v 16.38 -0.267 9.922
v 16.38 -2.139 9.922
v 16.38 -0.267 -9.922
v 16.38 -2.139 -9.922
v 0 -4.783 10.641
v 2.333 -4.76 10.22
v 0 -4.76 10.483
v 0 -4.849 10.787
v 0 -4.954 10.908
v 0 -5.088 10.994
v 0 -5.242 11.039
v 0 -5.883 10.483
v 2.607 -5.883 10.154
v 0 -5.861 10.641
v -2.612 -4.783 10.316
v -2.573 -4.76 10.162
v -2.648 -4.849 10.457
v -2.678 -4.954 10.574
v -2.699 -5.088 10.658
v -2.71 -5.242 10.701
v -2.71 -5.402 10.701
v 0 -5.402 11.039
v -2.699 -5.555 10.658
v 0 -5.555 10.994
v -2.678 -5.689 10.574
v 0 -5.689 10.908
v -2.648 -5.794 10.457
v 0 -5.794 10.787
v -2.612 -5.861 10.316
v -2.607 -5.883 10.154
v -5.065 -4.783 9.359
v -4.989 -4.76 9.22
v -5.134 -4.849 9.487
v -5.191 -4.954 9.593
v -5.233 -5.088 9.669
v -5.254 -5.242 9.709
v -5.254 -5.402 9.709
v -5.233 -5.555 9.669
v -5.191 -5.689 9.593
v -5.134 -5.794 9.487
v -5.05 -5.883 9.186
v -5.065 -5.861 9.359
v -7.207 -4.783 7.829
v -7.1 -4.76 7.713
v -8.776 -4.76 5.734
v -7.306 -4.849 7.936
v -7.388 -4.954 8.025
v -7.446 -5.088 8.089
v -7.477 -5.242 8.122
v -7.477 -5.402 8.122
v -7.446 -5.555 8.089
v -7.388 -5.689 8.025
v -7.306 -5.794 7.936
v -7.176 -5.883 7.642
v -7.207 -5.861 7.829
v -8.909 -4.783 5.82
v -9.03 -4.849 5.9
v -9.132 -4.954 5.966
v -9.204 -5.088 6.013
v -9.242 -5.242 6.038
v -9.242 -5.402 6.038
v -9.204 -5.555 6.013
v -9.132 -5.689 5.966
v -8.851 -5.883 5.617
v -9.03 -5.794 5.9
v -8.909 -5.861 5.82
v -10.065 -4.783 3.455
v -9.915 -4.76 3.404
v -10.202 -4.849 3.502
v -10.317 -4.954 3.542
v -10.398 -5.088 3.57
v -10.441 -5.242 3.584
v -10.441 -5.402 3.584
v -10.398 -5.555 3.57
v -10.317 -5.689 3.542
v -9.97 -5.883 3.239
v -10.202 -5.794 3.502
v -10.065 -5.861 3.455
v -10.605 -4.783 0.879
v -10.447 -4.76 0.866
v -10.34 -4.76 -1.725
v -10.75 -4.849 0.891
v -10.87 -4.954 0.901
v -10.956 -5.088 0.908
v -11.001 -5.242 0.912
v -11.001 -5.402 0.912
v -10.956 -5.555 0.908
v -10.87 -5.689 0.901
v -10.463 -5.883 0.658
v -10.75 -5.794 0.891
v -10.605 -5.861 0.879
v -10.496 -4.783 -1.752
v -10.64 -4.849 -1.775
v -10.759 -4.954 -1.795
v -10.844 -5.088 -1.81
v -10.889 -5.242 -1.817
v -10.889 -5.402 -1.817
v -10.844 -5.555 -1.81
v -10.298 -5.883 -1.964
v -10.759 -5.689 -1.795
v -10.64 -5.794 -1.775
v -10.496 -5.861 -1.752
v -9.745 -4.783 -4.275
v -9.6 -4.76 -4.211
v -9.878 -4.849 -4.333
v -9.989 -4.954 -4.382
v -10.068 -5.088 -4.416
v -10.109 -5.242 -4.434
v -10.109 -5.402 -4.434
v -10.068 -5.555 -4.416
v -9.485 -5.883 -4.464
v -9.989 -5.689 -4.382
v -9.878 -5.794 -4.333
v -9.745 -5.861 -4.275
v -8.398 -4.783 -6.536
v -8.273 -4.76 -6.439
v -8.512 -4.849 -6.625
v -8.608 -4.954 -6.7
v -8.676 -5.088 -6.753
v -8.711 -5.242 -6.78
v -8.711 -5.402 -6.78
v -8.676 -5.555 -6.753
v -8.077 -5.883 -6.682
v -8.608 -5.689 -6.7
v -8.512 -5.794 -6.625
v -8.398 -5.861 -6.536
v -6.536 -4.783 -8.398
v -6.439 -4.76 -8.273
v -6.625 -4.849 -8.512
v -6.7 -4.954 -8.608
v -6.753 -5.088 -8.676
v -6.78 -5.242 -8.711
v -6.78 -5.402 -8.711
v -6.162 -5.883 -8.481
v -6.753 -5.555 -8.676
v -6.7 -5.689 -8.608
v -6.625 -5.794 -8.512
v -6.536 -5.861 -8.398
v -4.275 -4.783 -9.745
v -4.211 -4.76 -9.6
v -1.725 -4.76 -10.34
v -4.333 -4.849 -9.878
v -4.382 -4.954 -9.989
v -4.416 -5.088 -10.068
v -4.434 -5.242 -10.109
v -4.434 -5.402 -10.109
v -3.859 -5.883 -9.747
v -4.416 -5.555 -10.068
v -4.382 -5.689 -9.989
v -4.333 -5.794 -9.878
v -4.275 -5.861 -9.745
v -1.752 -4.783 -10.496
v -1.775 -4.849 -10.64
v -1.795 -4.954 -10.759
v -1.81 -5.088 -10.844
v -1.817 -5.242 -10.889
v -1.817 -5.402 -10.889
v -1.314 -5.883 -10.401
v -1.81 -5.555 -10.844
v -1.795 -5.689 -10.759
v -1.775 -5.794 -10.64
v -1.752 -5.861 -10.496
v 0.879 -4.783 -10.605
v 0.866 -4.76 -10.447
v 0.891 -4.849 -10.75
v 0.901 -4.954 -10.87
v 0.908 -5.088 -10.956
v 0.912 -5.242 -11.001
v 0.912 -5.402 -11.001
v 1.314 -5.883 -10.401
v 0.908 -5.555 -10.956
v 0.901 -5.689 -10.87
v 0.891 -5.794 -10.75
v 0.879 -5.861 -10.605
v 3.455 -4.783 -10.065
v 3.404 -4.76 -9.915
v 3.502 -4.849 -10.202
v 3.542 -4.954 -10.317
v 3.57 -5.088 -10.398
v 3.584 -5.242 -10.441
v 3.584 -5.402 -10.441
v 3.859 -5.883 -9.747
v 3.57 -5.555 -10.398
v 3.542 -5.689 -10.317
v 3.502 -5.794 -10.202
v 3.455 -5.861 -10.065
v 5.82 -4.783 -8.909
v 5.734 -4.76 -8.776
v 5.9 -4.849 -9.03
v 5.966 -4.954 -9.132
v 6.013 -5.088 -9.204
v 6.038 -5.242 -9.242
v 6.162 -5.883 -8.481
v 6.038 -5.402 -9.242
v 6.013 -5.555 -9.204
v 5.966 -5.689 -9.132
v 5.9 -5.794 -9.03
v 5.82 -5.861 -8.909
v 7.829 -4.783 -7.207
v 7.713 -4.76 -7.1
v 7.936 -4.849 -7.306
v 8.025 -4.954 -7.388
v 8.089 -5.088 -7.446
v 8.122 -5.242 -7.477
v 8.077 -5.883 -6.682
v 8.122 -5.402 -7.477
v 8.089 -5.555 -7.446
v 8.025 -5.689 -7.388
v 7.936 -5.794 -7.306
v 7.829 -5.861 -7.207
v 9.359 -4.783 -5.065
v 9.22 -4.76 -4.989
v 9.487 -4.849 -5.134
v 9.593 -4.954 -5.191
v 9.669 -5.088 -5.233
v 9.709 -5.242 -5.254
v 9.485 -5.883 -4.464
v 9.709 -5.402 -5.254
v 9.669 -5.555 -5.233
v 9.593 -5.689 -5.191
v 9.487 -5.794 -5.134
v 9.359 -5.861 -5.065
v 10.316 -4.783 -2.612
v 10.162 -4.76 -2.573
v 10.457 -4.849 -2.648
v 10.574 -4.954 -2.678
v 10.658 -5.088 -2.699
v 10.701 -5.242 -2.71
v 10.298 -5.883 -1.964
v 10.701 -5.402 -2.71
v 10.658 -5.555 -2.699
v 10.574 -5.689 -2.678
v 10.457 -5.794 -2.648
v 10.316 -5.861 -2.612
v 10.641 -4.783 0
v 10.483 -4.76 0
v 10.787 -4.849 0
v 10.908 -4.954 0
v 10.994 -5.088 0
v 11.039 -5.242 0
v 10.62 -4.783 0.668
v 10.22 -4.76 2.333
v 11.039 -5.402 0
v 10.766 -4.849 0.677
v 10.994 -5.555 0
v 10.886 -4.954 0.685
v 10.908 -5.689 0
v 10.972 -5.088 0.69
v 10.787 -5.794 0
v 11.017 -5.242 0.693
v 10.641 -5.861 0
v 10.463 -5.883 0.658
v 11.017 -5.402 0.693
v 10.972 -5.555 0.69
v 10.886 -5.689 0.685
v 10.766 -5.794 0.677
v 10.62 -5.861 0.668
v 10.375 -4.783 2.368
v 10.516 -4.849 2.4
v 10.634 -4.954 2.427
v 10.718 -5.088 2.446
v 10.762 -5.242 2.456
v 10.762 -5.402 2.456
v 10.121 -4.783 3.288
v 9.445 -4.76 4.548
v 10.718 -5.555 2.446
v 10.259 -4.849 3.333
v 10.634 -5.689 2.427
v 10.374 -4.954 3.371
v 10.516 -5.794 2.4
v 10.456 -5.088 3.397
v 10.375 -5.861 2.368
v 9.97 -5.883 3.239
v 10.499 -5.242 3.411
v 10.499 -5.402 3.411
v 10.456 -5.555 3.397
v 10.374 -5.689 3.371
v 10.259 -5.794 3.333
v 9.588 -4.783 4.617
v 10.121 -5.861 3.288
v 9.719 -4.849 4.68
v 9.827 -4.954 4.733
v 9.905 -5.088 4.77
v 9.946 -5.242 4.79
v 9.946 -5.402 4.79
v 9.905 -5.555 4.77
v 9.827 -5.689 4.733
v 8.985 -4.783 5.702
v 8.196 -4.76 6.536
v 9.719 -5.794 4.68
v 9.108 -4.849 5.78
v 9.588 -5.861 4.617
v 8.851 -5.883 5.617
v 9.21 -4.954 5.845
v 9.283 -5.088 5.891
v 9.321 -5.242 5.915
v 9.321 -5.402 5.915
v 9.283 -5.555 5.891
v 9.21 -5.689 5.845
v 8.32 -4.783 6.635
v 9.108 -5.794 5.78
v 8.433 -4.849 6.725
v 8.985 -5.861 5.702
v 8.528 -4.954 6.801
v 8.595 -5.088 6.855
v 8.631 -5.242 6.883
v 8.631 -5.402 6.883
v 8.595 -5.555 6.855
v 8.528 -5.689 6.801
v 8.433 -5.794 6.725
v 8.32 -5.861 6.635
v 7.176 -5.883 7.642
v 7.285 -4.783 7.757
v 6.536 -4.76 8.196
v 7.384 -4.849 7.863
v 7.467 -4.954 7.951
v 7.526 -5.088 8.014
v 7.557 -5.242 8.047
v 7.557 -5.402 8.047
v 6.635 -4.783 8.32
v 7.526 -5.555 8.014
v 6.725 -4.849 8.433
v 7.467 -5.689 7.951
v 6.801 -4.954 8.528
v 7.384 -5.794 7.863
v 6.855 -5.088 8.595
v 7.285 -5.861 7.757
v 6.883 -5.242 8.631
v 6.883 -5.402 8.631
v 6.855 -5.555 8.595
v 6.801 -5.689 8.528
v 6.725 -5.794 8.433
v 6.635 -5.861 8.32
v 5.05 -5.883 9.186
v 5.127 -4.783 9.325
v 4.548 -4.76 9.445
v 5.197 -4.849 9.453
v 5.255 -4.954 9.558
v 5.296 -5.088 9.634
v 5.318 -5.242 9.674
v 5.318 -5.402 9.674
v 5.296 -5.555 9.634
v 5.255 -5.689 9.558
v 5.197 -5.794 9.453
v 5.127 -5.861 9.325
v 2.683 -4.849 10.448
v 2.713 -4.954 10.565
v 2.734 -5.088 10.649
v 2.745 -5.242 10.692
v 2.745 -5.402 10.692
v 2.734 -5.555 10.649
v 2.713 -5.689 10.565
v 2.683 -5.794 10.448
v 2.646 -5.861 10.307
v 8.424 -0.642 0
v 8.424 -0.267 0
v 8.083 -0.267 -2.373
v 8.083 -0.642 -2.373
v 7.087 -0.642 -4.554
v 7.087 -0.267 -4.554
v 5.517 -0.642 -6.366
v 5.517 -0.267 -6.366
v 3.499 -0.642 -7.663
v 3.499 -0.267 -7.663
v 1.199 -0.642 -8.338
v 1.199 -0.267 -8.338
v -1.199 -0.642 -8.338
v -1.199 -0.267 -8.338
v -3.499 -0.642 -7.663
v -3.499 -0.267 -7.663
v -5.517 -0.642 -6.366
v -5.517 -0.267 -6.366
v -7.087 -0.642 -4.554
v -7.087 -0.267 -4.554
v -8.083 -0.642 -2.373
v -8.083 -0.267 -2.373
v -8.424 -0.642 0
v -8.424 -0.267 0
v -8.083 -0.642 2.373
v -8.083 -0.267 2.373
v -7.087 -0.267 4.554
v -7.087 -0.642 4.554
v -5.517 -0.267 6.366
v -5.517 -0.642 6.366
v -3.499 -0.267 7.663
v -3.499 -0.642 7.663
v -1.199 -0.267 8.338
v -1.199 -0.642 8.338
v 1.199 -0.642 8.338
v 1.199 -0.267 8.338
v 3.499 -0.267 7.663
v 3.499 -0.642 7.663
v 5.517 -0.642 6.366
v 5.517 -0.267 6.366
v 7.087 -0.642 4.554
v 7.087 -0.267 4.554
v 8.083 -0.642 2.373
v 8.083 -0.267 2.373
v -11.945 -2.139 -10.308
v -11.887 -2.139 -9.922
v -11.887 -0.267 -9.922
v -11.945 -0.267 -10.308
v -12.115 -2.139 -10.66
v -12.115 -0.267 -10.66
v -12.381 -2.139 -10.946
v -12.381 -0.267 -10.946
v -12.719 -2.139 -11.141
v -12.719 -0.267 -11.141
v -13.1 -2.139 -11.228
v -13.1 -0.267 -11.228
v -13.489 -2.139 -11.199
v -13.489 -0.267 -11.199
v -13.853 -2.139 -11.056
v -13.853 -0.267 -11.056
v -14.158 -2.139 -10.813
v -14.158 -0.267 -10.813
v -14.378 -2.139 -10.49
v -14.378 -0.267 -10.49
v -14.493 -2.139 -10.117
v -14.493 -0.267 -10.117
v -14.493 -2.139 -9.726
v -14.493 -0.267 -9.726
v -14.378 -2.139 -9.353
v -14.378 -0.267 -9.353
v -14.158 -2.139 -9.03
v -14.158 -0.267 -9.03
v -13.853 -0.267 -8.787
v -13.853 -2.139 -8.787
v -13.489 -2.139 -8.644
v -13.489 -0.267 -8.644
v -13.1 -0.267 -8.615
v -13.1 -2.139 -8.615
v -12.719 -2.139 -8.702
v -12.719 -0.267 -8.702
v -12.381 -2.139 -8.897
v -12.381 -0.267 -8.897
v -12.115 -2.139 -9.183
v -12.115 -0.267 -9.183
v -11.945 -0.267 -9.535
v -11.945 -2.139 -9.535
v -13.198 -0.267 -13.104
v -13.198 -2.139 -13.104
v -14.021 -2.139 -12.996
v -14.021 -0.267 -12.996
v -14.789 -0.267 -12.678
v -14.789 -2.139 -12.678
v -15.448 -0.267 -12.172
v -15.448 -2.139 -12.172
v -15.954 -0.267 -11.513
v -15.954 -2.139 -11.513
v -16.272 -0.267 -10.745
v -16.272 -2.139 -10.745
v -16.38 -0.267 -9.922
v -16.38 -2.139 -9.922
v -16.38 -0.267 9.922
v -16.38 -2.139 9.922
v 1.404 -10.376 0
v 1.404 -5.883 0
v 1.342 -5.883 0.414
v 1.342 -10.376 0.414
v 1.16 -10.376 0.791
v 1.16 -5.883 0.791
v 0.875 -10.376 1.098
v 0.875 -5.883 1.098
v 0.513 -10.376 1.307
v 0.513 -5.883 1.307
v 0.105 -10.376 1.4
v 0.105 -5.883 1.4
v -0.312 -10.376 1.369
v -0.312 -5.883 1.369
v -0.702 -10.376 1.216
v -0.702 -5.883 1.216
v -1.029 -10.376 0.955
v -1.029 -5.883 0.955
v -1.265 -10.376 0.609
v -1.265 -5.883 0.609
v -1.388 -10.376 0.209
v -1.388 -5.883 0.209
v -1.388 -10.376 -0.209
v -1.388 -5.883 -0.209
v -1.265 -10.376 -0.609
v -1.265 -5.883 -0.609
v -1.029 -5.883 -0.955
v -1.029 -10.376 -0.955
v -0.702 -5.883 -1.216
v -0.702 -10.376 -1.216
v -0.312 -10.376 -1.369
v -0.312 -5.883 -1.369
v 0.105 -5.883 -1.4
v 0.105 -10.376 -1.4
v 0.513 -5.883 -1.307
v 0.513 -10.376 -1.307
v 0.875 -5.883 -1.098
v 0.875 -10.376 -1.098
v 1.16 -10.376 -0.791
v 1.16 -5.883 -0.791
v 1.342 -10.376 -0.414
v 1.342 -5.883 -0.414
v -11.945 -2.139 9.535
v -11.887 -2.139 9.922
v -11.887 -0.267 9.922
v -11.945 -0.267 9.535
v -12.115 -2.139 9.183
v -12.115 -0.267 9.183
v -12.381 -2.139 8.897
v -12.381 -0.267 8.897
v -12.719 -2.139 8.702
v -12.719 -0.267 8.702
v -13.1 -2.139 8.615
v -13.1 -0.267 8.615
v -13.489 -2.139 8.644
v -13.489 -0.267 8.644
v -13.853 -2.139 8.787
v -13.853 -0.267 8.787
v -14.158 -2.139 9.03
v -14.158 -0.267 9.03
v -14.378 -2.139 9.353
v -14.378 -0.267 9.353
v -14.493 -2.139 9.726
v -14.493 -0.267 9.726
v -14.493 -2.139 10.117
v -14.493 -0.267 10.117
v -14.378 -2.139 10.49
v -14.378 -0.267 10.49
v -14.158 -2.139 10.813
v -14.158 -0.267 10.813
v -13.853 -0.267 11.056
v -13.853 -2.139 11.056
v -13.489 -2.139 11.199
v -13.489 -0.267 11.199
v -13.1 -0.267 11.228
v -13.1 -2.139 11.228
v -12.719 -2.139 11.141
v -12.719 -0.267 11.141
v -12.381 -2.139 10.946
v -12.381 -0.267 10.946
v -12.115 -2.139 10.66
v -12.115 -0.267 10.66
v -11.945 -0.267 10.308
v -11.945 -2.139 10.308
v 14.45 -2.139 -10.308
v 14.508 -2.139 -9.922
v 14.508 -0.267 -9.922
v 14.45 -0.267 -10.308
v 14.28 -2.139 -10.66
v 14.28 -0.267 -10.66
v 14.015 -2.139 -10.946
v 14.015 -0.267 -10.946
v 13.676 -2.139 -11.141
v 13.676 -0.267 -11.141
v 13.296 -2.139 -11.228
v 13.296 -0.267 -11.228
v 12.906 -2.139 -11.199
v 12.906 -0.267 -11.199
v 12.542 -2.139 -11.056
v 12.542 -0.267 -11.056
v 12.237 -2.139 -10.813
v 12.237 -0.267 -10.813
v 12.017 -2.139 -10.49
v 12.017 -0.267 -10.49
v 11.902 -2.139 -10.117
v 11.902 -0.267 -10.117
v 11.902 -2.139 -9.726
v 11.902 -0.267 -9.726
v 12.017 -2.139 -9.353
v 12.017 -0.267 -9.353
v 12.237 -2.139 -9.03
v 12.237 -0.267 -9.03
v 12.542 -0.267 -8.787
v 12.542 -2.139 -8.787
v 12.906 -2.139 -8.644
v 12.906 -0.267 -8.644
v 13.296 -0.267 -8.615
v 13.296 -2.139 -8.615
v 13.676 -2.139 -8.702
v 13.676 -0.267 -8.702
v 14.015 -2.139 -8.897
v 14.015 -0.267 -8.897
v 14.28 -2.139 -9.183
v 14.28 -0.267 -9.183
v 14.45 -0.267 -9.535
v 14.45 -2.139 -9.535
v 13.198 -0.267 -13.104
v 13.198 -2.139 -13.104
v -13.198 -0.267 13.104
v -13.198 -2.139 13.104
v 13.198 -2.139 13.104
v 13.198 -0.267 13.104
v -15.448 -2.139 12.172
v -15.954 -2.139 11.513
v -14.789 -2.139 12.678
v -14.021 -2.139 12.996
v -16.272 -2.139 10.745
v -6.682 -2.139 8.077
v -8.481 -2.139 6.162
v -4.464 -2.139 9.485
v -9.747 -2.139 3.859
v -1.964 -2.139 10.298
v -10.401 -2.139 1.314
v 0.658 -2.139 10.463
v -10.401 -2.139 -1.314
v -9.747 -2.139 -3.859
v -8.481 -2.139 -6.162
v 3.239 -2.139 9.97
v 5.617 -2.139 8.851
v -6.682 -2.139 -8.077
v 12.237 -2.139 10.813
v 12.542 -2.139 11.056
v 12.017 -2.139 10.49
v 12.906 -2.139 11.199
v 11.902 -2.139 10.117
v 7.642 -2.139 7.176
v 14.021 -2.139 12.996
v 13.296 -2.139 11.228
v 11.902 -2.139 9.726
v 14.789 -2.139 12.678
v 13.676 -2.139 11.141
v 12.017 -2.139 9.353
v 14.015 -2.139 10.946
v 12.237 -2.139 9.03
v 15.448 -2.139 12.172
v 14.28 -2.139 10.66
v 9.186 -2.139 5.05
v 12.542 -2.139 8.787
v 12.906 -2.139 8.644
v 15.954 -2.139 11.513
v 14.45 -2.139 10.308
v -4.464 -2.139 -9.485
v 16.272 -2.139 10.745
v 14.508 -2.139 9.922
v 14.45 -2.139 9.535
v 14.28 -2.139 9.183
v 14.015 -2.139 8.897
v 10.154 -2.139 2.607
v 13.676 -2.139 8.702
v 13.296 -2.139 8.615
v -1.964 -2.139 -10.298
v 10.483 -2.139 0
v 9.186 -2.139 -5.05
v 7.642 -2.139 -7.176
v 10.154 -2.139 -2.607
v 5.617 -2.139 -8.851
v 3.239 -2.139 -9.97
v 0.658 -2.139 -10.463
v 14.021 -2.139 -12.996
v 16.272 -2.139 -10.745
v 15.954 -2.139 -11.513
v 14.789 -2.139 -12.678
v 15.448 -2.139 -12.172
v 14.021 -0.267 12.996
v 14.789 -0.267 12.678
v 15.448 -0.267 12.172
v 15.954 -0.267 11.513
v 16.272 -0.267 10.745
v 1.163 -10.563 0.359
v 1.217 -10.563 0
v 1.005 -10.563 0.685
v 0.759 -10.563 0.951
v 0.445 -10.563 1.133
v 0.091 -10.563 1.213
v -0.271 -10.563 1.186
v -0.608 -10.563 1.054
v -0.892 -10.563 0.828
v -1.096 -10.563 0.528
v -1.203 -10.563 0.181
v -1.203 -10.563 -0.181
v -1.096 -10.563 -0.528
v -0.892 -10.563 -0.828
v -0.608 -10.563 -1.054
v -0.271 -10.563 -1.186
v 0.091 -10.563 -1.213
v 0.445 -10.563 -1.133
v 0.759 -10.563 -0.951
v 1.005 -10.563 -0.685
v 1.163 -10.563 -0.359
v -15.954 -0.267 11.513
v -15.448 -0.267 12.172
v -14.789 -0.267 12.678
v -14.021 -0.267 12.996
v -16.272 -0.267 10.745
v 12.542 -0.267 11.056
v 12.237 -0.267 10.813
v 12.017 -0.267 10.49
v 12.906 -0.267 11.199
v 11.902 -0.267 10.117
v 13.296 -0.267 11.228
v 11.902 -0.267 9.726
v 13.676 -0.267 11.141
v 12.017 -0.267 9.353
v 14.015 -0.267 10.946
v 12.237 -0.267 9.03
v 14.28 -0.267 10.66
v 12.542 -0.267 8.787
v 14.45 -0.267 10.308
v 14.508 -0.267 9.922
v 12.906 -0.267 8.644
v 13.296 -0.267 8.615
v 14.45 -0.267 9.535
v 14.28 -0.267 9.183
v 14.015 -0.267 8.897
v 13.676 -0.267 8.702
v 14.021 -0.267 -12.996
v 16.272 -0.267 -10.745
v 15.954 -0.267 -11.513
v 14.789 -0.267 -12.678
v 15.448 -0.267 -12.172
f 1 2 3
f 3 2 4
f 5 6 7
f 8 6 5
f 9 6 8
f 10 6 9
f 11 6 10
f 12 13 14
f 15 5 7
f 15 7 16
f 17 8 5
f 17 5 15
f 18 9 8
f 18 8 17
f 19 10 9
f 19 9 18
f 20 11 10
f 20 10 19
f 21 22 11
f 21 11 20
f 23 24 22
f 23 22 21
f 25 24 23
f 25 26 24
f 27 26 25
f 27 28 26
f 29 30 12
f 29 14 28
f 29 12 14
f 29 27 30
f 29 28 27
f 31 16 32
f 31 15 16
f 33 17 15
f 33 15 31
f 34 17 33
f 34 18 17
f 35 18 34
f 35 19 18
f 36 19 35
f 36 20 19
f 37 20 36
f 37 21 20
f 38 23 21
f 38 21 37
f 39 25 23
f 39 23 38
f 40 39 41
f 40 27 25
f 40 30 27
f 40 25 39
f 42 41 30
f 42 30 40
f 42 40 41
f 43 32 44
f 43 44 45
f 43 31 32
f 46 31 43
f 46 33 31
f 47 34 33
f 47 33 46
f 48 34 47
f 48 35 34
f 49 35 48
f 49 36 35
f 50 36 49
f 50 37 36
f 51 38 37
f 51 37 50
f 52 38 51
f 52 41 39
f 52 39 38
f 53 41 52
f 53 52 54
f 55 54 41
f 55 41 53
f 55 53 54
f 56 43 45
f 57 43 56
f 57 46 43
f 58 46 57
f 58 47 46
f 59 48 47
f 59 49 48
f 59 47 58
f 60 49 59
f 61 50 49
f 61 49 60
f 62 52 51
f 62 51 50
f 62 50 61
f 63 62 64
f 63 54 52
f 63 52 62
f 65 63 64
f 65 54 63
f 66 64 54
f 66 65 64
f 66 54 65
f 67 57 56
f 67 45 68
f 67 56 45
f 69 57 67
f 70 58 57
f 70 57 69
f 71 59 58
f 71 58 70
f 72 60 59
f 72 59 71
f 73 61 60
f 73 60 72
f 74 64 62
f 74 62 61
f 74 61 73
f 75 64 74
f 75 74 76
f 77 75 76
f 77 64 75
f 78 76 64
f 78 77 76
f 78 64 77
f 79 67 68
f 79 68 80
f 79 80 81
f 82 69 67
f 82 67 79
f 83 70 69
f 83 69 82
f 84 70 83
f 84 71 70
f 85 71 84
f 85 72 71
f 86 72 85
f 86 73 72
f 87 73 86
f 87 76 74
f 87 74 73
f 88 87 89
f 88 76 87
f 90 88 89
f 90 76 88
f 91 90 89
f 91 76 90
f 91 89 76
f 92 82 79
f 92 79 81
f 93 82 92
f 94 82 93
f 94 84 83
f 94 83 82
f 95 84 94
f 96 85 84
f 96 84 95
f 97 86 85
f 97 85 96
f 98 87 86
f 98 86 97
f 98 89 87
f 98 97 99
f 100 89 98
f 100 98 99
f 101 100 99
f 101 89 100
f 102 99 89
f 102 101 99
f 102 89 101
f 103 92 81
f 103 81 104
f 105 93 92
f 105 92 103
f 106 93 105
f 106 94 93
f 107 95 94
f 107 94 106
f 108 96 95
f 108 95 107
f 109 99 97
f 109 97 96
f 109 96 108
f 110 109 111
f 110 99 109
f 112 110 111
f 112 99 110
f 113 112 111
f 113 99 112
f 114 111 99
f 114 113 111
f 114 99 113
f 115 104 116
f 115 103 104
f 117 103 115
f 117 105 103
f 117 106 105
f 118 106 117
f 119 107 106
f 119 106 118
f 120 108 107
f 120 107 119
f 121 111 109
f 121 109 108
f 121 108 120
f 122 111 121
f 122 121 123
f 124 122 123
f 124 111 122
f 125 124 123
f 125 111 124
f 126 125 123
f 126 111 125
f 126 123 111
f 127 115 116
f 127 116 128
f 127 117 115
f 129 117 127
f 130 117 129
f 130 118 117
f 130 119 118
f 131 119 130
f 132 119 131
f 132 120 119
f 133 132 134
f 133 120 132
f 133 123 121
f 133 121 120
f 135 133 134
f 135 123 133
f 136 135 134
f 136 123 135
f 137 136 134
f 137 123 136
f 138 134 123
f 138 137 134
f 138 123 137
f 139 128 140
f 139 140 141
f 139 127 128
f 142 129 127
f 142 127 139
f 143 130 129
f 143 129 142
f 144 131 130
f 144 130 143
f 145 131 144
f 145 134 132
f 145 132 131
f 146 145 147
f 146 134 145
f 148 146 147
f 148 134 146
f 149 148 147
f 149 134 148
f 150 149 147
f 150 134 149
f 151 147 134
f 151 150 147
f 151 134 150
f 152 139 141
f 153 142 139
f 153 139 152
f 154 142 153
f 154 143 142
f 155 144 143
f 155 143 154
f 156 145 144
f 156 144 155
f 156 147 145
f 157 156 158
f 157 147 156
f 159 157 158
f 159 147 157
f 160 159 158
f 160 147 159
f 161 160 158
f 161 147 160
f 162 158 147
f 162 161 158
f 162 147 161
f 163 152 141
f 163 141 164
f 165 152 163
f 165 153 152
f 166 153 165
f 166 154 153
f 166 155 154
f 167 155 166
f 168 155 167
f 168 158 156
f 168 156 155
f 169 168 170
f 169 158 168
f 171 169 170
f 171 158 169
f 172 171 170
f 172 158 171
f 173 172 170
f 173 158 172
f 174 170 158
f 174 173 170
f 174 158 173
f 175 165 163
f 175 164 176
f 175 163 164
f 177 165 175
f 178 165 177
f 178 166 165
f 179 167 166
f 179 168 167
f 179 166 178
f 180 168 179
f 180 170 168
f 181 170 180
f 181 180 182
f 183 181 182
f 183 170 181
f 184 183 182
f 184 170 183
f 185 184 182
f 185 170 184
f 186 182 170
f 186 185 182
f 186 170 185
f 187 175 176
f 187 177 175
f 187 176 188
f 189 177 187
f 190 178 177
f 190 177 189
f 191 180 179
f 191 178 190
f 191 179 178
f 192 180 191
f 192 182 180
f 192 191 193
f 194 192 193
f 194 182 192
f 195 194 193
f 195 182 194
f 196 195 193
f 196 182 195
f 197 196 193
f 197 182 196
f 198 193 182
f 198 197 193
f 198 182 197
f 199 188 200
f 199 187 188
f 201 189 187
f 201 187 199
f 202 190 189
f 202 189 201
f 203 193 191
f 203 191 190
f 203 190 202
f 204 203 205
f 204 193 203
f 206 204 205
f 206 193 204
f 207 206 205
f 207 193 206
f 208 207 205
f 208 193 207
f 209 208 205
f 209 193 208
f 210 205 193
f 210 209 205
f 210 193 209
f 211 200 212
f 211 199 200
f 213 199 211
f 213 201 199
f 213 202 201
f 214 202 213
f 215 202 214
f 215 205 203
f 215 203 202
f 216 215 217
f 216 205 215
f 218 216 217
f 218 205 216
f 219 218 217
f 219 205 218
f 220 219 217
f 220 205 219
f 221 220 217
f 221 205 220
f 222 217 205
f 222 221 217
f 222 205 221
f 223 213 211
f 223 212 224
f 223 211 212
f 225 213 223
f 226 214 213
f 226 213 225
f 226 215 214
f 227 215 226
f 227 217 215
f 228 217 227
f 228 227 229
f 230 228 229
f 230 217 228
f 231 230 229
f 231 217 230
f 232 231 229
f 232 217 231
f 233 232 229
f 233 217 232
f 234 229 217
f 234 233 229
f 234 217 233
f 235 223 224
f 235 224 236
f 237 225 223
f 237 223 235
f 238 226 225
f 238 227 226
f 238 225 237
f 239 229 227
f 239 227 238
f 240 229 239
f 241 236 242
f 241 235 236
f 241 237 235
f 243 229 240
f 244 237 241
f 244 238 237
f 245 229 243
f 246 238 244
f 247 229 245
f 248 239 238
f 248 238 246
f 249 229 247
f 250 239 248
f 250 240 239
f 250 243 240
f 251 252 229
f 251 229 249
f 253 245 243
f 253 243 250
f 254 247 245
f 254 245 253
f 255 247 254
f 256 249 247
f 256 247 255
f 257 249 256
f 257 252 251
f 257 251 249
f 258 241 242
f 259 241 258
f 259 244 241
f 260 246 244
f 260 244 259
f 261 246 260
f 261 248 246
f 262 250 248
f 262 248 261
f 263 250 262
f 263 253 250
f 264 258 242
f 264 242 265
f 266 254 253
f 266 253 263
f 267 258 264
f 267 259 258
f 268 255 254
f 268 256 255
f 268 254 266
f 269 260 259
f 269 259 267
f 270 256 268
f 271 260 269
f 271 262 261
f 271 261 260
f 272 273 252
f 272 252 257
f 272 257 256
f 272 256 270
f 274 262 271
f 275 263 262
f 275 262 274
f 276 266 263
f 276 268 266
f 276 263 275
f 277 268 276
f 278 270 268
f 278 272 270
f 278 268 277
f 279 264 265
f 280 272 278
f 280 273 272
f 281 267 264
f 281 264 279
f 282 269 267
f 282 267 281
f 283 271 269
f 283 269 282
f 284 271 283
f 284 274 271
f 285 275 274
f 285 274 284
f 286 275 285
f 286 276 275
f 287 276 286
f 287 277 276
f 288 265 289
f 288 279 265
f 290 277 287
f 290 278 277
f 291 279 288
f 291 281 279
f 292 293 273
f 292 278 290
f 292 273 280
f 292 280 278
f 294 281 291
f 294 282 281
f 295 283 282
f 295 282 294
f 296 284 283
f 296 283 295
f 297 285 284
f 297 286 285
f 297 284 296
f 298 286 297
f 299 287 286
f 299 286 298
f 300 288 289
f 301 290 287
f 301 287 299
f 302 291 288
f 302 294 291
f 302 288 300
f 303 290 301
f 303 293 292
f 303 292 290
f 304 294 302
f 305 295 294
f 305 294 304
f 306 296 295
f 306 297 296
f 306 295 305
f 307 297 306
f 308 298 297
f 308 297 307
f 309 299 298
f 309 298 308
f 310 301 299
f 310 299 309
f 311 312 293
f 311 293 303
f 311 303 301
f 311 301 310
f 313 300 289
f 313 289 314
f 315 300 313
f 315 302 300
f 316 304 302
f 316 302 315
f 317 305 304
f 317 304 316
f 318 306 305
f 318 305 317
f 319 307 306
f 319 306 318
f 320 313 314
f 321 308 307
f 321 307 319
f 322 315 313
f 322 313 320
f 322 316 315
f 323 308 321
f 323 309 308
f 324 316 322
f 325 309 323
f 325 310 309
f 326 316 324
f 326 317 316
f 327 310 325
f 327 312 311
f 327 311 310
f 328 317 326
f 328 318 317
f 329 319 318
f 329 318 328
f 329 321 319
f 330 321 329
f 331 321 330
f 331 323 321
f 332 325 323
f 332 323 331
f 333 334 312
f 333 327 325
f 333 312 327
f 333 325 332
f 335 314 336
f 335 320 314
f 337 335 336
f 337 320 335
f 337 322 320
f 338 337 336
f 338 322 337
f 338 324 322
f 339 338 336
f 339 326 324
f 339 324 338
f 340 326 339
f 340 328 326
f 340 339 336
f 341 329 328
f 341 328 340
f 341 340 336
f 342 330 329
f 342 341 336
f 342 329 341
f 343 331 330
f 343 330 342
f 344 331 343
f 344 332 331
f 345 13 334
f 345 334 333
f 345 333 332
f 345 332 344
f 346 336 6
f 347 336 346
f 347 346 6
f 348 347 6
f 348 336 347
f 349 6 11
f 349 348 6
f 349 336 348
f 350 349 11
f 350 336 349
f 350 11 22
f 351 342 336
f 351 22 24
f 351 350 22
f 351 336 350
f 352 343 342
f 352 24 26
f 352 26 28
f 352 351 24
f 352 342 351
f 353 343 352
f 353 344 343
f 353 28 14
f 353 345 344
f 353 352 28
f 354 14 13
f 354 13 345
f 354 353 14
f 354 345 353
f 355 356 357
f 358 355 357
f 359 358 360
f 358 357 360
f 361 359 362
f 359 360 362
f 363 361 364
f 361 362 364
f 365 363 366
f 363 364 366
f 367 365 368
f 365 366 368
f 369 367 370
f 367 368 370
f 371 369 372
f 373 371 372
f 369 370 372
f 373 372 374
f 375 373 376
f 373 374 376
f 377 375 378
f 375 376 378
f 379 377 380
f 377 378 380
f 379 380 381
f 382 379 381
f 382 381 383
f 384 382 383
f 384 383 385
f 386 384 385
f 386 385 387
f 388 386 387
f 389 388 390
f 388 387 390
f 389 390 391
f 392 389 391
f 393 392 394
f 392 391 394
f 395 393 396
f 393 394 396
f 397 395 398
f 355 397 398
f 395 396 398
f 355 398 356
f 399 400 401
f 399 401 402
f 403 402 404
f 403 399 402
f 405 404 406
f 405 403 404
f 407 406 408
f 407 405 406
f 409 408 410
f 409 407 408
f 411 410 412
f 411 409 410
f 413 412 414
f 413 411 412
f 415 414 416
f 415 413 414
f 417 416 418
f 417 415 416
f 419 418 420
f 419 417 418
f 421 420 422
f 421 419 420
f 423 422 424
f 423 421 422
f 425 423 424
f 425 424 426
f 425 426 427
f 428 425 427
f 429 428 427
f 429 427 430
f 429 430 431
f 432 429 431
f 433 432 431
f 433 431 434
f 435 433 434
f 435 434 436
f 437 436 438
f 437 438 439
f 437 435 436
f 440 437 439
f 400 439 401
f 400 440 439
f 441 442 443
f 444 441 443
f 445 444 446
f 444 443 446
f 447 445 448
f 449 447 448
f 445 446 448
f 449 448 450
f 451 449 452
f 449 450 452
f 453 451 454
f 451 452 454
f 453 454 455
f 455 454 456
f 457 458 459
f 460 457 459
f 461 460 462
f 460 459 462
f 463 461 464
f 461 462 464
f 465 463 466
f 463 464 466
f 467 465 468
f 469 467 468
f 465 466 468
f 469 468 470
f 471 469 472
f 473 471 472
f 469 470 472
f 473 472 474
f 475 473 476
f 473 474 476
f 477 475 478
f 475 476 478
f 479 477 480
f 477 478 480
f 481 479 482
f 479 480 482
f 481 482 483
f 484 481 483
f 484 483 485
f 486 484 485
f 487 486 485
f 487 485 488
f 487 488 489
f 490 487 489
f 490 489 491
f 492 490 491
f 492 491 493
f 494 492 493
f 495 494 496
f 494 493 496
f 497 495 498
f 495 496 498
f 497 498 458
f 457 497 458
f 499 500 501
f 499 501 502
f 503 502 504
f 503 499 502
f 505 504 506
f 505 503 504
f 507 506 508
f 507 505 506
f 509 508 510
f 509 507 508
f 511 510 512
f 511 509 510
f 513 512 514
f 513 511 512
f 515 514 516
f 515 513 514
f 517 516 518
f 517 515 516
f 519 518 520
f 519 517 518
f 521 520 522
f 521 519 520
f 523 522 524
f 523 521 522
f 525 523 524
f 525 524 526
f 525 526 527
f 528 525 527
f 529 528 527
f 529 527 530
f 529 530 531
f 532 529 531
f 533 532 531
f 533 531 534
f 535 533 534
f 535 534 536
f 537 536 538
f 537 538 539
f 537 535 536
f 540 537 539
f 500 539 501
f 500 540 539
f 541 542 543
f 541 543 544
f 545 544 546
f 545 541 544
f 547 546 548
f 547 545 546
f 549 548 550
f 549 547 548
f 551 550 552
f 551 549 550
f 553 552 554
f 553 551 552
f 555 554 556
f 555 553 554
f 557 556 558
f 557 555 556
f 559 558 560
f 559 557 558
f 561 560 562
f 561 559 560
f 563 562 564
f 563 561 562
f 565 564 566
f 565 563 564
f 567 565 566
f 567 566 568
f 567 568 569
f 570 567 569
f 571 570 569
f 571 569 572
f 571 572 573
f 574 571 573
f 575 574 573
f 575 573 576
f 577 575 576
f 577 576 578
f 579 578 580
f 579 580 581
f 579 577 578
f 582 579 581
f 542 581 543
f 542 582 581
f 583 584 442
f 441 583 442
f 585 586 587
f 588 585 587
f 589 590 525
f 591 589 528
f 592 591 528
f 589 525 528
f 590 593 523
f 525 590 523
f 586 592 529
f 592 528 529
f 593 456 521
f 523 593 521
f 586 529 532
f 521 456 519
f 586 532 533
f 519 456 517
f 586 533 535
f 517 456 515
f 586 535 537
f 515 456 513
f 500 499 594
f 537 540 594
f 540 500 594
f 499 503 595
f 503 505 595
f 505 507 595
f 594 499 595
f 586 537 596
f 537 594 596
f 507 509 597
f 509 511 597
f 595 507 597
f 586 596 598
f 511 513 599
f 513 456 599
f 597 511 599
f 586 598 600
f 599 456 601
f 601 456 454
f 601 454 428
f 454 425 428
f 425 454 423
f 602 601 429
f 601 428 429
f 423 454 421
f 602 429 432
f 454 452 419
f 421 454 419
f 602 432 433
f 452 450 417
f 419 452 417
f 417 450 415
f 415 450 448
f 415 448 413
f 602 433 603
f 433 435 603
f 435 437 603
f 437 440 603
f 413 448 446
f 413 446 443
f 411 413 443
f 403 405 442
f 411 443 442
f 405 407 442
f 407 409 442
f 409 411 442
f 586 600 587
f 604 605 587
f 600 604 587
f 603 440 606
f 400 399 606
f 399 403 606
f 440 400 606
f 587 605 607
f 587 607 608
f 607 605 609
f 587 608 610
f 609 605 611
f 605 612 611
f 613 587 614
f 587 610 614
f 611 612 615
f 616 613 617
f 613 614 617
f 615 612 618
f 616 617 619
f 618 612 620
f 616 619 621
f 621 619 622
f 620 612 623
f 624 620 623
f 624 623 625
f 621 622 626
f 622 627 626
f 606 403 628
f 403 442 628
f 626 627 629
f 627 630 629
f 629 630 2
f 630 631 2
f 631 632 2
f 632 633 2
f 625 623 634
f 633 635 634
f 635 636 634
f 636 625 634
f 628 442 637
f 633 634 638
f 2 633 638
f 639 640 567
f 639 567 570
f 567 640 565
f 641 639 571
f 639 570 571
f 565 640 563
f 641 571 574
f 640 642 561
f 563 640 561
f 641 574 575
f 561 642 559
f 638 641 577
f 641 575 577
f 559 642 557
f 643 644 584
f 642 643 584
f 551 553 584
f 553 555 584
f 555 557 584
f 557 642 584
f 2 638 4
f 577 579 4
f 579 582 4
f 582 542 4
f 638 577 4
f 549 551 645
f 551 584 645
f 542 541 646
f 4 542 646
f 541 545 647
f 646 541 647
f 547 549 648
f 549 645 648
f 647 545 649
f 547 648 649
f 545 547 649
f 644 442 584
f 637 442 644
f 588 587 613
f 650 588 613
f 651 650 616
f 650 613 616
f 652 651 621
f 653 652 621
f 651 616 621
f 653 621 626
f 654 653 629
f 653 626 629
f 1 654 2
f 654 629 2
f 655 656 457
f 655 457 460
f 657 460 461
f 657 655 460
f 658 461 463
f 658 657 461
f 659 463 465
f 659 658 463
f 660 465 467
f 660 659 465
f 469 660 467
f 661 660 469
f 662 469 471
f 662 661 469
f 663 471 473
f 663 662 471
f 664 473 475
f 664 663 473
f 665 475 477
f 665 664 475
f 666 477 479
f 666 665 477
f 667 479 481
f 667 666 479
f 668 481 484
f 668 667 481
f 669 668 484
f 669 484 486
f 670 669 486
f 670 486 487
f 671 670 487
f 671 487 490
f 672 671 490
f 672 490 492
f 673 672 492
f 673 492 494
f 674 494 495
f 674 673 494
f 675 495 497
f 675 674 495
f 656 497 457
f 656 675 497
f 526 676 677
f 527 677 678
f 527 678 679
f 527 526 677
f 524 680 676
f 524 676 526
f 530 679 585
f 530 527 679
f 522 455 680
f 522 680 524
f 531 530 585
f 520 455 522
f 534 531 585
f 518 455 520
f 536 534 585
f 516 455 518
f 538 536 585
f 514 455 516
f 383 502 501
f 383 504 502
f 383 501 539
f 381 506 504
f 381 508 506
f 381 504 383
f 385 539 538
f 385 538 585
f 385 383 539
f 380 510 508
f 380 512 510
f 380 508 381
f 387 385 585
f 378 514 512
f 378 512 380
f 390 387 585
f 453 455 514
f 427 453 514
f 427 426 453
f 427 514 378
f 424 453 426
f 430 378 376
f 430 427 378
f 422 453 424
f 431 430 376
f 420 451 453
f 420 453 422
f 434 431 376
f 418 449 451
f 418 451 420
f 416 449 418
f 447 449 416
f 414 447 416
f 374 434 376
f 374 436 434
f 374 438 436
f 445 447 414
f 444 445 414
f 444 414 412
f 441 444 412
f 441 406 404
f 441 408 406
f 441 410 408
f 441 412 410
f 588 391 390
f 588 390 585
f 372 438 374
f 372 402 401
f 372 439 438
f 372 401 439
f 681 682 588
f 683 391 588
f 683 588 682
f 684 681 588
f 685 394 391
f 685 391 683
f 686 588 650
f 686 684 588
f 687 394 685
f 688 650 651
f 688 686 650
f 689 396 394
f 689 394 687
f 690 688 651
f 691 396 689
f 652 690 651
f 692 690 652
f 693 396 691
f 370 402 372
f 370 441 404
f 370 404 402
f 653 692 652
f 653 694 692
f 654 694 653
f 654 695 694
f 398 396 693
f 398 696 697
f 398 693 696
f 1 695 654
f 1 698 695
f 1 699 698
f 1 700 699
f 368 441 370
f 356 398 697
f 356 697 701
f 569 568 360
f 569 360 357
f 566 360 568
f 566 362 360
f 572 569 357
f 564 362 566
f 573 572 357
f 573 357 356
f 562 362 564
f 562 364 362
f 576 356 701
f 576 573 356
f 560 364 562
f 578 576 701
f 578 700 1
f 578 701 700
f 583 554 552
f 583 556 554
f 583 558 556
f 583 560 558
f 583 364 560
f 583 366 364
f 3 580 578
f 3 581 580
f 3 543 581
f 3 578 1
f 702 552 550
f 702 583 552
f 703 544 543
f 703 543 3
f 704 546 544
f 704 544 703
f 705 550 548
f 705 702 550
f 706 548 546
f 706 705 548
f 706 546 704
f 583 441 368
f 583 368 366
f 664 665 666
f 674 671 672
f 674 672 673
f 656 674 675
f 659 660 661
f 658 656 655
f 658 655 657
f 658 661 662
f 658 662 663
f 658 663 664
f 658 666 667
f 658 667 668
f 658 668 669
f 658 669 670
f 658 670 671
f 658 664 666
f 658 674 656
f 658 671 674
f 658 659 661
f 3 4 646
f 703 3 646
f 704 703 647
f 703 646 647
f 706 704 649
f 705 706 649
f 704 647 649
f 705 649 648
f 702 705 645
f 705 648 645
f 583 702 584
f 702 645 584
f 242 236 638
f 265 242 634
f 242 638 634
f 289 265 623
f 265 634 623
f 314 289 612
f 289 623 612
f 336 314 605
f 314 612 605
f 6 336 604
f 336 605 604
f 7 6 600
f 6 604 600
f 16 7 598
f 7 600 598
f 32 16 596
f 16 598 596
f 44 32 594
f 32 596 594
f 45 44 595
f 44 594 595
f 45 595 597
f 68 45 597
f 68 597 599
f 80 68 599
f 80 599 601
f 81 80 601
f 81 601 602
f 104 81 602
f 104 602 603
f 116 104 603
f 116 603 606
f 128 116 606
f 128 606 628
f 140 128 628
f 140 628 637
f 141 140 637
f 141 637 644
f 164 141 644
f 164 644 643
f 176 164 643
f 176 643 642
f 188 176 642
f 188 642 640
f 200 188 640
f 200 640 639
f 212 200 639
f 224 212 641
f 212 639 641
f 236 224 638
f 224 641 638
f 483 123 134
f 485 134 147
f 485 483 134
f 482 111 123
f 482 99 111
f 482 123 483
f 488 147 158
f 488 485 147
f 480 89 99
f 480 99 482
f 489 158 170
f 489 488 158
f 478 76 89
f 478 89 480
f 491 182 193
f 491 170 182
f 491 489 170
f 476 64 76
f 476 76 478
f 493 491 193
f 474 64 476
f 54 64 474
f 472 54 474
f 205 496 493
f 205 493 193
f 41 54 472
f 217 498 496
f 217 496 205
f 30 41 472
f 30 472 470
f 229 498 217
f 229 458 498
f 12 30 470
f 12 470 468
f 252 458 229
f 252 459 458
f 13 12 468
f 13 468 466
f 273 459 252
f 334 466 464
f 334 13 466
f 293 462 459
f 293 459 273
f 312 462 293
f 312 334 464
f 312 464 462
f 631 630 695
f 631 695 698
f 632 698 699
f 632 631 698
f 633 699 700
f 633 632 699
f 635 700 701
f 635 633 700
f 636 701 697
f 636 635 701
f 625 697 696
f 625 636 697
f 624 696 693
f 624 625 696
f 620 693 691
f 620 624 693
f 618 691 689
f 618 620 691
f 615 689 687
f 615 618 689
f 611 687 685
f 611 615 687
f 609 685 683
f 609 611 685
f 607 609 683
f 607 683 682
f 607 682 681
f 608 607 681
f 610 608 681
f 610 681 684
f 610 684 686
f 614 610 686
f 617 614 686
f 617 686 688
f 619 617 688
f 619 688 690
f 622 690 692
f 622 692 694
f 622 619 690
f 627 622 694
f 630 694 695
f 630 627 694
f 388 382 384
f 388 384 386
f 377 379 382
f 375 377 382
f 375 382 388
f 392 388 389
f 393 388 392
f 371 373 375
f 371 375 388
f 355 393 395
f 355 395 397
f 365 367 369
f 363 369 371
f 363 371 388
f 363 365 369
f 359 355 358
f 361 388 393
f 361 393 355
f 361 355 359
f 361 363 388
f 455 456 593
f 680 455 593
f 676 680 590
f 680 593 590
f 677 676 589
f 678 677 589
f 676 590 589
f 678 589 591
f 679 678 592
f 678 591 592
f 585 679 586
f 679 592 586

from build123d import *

# Parameters (mm, degrees)
SKETCH1_R           = 7
BOSS_EXTRUDE1_DEPTH = 10
SKETCH2_R           = 56
BOSS_EXTRUDE2_DEPTH = 20
SKETCH3_R           = 3
SKETCH4_R           = 7.5
BOSS_EXTRUDE3_DEPTH = 25
CHAMFER1_SIZE       = 1
SKETCH5_R           = 45
CUT_EXTRUDE1_DEPTH  = 2
SCALE1_SCALE        = 0.18
SCALE2_SCALE        = 1.04


with BuildPart() as part:
    # Sketch1 → Boss-Extrude1 (new body)
    with BuildSketch(Plane(origin=(0, 0, 0), x_dir=(1, 0, 0), z_dir=(0, 1, 0))):
        with BuildLine():
            Line((-70.5, -70), (70.5, -70))
            ThreePointArc((70.5, -70), (82.52081528, -65.02081528), (87.5, -53))
            Line((87.5, -53), (87.5, 53))
            ThreePointArc((87.5, 53), (82.52081528, 65.02081528), (70.5, 70))
            Line((70.5, 70), (-70.5, 70))
            ThreePointArc((-70.5, 70), (-82.52081528, 65.02081528), (-87.5, 53))
            Line((-87.5, 53), (-87.5, -53))
            ThreePointArc((-87.5, -53), (-82.52081528, -65.02081528), (-70.5, -70))
        make_face()
        with Locations((-70.5, 53)):
            Circle(SKETCH1_R, mode=Mode.SUBTRACT)
        with Locations((-70.5, -53)):
            Circle(SKETCH1_R, mode=Mode.SUBTRACT)
        with Locations((70.5, -53)):
            Circle(SKETCH1_R, mode=Mode.SUBTRACT)
        with Locations((70.5, 53)):
            Circle(SKETCH1_R, mode=Mode.SUBTRACT)
    extrude(amount=BOSS_EXTRUDE1_DEPTH)

    # Sketch2 → Boss-Extrude2 (add)
    with BuildSketch(Plane.XZ):
        Circle(SKETCH2_R)
    extrude(amount=BOSS_EXTRUDE2_DEPTH)

    # Sketch3 → Revolve1 (revolve)
    with BuildSketch(Plane(origin=(0, 0, 0), x_dir=(0, 0, -1), z_dir=(1, 0, 0))):
        with Locations((-56, -17)):
            Circle(SKETCH3_R)
    revolve(axis=Axis((0, 0, 0), (0, -1, 0)))

    # Sketch4 → Boss-Extrude3 (add)
    with BuildSketch(Plane.XZ.offset(20)):
        Circle(SKETCH4_R)
    extrude(amount=BOSS_EXTRUDE3_DEPTH)

    # Chamfer1
    chamfer1_edges = [part.edges().sort_by_distance(p)[0] for p in [
        (-7.5, -45, 0),
    ]]
    chamfer(chamfer1_edges, length=CHAMFER1_SIZE)

    # Sketch5 → Cut-Extrude1 (cut)
    with BuildSketch(Plane(origin=(0, 10, 0), x_dir=(1, 0, 0), z_dir=(0, 1, 0))):
        Circle(SKETCH5_R)
    extrude(amount=-CUT_EXTRUDE1_DEPTH, mode=Mode.SUBTRACT)


with BuildPart() as part_1:
    # Scale1: scaled about (0, -2.631964086, 0)
    add(part.part.scale(SCALE1_SCALE).moved(Location((0, -2.158210551, 0))))


with BuildPart() as part_2:
    # Scale2: scaled about (0, -2.631964086, 0)
    add(part_1.part.scale(SCALE2_SCALE).moved(Location((0, 0.105278563, 0))))


solid = part_2.part
